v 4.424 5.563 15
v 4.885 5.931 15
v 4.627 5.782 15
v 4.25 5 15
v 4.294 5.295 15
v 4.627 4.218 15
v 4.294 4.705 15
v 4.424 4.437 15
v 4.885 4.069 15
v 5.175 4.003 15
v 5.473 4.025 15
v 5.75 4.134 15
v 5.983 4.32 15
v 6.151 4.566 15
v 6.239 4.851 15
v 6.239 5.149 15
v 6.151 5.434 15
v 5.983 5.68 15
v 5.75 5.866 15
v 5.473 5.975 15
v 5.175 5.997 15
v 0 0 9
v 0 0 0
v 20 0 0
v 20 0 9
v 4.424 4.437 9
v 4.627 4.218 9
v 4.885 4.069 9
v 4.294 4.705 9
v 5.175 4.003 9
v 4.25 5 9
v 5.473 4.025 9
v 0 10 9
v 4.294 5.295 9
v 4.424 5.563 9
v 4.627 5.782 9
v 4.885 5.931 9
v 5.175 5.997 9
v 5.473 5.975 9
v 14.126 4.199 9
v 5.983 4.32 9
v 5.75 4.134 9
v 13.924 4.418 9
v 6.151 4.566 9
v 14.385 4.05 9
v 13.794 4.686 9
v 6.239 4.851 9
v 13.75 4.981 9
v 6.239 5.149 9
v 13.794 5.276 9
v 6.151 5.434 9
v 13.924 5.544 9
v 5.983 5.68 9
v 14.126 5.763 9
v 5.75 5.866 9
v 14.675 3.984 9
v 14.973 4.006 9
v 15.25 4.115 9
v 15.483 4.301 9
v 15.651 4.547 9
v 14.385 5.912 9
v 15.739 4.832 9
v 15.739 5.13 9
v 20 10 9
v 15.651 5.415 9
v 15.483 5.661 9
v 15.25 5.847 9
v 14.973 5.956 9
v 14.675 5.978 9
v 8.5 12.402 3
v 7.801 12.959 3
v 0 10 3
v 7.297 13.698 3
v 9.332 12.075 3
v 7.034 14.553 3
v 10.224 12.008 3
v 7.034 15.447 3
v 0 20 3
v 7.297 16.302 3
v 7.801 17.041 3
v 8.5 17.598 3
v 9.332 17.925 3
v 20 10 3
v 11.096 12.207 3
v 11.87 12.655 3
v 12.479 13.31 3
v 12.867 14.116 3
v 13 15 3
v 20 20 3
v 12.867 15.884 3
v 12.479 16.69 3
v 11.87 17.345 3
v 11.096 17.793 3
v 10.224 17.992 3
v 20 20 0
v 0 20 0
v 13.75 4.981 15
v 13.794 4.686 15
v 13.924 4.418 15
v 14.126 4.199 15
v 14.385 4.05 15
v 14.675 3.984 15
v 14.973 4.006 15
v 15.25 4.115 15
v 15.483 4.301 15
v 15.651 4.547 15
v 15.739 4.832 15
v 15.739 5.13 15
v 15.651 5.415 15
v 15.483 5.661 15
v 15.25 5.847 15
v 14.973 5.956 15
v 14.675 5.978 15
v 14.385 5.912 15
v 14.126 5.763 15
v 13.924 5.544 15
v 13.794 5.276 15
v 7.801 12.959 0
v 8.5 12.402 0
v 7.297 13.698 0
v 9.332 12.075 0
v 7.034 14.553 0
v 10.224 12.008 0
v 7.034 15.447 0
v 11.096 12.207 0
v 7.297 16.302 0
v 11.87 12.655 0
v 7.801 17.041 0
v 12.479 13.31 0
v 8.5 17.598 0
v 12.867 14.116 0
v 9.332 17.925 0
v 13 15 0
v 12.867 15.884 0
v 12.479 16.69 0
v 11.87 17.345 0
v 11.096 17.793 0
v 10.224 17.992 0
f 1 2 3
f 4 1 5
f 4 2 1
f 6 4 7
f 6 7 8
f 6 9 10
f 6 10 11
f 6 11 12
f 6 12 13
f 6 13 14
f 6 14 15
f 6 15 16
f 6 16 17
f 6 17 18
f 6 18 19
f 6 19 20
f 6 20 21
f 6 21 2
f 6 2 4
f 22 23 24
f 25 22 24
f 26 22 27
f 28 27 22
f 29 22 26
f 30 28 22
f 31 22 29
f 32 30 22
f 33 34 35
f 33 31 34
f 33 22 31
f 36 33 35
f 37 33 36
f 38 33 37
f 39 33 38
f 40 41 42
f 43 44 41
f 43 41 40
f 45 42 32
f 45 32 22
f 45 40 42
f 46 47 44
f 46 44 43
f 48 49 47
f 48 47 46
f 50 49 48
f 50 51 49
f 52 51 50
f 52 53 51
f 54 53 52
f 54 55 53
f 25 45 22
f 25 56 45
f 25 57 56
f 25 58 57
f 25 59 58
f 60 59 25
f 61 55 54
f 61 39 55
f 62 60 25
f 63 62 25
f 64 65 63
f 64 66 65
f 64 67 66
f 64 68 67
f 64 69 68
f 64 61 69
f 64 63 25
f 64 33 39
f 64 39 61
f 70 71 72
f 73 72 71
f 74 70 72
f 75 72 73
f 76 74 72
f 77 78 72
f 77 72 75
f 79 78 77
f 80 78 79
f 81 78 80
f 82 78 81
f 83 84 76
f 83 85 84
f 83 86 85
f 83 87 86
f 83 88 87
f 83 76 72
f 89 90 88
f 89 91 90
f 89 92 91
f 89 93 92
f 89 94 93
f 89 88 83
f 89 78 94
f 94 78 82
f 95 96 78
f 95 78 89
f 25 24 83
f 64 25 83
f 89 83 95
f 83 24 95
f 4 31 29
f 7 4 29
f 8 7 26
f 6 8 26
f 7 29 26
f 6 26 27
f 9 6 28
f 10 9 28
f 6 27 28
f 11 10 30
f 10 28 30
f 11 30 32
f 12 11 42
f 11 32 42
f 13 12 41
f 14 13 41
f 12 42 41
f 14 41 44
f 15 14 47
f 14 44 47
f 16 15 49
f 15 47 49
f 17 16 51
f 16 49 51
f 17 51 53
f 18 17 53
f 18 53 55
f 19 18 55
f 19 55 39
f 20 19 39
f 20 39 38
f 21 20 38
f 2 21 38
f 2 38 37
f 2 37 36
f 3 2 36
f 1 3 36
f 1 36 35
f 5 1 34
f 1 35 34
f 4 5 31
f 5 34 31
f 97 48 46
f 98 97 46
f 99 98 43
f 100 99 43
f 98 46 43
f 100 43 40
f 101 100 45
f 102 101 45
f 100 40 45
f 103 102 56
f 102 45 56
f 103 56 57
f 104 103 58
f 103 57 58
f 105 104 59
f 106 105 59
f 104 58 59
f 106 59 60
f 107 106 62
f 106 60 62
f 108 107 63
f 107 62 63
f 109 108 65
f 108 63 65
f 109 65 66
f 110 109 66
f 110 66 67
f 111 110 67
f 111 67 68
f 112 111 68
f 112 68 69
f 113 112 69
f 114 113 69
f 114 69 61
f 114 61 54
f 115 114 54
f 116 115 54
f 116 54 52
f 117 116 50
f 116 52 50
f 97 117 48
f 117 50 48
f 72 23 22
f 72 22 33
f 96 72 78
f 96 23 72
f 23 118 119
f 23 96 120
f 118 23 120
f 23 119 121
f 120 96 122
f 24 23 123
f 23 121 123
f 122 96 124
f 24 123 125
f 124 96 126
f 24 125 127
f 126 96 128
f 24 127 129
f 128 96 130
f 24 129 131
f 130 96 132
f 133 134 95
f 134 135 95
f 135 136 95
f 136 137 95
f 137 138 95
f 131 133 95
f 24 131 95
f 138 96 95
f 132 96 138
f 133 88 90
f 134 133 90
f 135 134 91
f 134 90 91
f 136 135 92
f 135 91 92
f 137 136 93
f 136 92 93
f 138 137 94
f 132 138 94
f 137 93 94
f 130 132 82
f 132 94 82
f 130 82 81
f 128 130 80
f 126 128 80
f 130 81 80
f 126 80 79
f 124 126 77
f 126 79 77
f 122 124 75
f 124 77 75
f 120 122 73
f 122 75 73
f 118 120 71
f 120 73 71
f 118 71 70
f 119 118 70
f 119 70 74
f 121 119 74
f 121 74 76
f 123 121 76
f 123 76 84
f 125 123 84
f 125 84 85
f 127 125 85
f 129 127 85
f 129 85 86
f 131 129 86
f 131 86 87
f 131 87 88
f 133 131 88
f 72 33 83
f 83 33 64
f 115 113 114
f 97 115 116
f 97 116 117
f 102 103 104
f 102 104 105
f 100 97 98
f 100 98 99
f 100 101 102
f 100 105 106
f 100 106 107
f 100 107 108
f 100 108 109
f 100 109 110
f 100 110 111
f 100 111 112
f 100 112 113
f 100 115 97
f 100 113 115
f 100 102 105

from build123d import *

# Parameters (mm, degrees)
SKETCH_1_W          = 20
SKETCH_1_H          = 20
EXTRUDE_1_DEPTH     = 9
SKETCH_2_R          = 1
EXTRUDE_2_DEPTH     = 6
SKETCH_3_W          = 20
SKETCH_3_H          = 10
CUT_EXTRUDE_1_DEPTH = 6
CUT_EXTRUDE_2_REACH = 32.725
SKETCH_4_R          = 3


with BuildPart() as part:
    # 草图1 → 凸台-拉伸1 (new body)
    with BuildSketch(Plane.XY):
        with Locations((10, 10)):
            Rectangle(SKETCH_1_W, SKETCH_1_H)
    extrude(amount=EXTRUDE_1_DEPTH)

    # 草图2 → 凸台-拉伸2 (add)
    with BuildSketch(Plane.XY.offset(9)):
        with Locations(Location((5.25, 5, 0), (0, 0, 180))):
            Circle(SKETCH_2_R)
        with Locations(Location((14.749981105, 4.981052524, 0), (0, 0, 180))):
            Circle(SKETCH_2_R)
    extrude(amount=EXTRUDE_2_DEPTH)

    # 草图3 → 切除-拉伸1 (cut)
    with BuildSketch(Plane.XY.offset(9)):
        with Locations((10, 15)):
            Rectangle(SKETCH_3_W, SKETCH_3_H)
    extrude(amount=-CUT_EXTRUDE_1_DEPTH, mode=Mode.SUBTRACT)

    # 草图4 → 切除-拉伸2 (cut, up to next)
    with BuildSketch(Plane.XY.offset(3), mode=Mode.PRIVATE) as cut_extrude_2_sk1:
        with Locations((10, 15)):
            Circle(SKETCH_4_R)
    cut_extrude_2_tool1 = extrude(cut_extrude_2_sk1.sketch, amount=-CUT_EXTRUDE_2_REACH, mode=Mode.PRIVATE) & part.part
    add(cut_extrude_2_tool1.solids().sort_by_distance((10, 15, 3))[0], mode=Mode.SUBTRACT)


solid = part.part
